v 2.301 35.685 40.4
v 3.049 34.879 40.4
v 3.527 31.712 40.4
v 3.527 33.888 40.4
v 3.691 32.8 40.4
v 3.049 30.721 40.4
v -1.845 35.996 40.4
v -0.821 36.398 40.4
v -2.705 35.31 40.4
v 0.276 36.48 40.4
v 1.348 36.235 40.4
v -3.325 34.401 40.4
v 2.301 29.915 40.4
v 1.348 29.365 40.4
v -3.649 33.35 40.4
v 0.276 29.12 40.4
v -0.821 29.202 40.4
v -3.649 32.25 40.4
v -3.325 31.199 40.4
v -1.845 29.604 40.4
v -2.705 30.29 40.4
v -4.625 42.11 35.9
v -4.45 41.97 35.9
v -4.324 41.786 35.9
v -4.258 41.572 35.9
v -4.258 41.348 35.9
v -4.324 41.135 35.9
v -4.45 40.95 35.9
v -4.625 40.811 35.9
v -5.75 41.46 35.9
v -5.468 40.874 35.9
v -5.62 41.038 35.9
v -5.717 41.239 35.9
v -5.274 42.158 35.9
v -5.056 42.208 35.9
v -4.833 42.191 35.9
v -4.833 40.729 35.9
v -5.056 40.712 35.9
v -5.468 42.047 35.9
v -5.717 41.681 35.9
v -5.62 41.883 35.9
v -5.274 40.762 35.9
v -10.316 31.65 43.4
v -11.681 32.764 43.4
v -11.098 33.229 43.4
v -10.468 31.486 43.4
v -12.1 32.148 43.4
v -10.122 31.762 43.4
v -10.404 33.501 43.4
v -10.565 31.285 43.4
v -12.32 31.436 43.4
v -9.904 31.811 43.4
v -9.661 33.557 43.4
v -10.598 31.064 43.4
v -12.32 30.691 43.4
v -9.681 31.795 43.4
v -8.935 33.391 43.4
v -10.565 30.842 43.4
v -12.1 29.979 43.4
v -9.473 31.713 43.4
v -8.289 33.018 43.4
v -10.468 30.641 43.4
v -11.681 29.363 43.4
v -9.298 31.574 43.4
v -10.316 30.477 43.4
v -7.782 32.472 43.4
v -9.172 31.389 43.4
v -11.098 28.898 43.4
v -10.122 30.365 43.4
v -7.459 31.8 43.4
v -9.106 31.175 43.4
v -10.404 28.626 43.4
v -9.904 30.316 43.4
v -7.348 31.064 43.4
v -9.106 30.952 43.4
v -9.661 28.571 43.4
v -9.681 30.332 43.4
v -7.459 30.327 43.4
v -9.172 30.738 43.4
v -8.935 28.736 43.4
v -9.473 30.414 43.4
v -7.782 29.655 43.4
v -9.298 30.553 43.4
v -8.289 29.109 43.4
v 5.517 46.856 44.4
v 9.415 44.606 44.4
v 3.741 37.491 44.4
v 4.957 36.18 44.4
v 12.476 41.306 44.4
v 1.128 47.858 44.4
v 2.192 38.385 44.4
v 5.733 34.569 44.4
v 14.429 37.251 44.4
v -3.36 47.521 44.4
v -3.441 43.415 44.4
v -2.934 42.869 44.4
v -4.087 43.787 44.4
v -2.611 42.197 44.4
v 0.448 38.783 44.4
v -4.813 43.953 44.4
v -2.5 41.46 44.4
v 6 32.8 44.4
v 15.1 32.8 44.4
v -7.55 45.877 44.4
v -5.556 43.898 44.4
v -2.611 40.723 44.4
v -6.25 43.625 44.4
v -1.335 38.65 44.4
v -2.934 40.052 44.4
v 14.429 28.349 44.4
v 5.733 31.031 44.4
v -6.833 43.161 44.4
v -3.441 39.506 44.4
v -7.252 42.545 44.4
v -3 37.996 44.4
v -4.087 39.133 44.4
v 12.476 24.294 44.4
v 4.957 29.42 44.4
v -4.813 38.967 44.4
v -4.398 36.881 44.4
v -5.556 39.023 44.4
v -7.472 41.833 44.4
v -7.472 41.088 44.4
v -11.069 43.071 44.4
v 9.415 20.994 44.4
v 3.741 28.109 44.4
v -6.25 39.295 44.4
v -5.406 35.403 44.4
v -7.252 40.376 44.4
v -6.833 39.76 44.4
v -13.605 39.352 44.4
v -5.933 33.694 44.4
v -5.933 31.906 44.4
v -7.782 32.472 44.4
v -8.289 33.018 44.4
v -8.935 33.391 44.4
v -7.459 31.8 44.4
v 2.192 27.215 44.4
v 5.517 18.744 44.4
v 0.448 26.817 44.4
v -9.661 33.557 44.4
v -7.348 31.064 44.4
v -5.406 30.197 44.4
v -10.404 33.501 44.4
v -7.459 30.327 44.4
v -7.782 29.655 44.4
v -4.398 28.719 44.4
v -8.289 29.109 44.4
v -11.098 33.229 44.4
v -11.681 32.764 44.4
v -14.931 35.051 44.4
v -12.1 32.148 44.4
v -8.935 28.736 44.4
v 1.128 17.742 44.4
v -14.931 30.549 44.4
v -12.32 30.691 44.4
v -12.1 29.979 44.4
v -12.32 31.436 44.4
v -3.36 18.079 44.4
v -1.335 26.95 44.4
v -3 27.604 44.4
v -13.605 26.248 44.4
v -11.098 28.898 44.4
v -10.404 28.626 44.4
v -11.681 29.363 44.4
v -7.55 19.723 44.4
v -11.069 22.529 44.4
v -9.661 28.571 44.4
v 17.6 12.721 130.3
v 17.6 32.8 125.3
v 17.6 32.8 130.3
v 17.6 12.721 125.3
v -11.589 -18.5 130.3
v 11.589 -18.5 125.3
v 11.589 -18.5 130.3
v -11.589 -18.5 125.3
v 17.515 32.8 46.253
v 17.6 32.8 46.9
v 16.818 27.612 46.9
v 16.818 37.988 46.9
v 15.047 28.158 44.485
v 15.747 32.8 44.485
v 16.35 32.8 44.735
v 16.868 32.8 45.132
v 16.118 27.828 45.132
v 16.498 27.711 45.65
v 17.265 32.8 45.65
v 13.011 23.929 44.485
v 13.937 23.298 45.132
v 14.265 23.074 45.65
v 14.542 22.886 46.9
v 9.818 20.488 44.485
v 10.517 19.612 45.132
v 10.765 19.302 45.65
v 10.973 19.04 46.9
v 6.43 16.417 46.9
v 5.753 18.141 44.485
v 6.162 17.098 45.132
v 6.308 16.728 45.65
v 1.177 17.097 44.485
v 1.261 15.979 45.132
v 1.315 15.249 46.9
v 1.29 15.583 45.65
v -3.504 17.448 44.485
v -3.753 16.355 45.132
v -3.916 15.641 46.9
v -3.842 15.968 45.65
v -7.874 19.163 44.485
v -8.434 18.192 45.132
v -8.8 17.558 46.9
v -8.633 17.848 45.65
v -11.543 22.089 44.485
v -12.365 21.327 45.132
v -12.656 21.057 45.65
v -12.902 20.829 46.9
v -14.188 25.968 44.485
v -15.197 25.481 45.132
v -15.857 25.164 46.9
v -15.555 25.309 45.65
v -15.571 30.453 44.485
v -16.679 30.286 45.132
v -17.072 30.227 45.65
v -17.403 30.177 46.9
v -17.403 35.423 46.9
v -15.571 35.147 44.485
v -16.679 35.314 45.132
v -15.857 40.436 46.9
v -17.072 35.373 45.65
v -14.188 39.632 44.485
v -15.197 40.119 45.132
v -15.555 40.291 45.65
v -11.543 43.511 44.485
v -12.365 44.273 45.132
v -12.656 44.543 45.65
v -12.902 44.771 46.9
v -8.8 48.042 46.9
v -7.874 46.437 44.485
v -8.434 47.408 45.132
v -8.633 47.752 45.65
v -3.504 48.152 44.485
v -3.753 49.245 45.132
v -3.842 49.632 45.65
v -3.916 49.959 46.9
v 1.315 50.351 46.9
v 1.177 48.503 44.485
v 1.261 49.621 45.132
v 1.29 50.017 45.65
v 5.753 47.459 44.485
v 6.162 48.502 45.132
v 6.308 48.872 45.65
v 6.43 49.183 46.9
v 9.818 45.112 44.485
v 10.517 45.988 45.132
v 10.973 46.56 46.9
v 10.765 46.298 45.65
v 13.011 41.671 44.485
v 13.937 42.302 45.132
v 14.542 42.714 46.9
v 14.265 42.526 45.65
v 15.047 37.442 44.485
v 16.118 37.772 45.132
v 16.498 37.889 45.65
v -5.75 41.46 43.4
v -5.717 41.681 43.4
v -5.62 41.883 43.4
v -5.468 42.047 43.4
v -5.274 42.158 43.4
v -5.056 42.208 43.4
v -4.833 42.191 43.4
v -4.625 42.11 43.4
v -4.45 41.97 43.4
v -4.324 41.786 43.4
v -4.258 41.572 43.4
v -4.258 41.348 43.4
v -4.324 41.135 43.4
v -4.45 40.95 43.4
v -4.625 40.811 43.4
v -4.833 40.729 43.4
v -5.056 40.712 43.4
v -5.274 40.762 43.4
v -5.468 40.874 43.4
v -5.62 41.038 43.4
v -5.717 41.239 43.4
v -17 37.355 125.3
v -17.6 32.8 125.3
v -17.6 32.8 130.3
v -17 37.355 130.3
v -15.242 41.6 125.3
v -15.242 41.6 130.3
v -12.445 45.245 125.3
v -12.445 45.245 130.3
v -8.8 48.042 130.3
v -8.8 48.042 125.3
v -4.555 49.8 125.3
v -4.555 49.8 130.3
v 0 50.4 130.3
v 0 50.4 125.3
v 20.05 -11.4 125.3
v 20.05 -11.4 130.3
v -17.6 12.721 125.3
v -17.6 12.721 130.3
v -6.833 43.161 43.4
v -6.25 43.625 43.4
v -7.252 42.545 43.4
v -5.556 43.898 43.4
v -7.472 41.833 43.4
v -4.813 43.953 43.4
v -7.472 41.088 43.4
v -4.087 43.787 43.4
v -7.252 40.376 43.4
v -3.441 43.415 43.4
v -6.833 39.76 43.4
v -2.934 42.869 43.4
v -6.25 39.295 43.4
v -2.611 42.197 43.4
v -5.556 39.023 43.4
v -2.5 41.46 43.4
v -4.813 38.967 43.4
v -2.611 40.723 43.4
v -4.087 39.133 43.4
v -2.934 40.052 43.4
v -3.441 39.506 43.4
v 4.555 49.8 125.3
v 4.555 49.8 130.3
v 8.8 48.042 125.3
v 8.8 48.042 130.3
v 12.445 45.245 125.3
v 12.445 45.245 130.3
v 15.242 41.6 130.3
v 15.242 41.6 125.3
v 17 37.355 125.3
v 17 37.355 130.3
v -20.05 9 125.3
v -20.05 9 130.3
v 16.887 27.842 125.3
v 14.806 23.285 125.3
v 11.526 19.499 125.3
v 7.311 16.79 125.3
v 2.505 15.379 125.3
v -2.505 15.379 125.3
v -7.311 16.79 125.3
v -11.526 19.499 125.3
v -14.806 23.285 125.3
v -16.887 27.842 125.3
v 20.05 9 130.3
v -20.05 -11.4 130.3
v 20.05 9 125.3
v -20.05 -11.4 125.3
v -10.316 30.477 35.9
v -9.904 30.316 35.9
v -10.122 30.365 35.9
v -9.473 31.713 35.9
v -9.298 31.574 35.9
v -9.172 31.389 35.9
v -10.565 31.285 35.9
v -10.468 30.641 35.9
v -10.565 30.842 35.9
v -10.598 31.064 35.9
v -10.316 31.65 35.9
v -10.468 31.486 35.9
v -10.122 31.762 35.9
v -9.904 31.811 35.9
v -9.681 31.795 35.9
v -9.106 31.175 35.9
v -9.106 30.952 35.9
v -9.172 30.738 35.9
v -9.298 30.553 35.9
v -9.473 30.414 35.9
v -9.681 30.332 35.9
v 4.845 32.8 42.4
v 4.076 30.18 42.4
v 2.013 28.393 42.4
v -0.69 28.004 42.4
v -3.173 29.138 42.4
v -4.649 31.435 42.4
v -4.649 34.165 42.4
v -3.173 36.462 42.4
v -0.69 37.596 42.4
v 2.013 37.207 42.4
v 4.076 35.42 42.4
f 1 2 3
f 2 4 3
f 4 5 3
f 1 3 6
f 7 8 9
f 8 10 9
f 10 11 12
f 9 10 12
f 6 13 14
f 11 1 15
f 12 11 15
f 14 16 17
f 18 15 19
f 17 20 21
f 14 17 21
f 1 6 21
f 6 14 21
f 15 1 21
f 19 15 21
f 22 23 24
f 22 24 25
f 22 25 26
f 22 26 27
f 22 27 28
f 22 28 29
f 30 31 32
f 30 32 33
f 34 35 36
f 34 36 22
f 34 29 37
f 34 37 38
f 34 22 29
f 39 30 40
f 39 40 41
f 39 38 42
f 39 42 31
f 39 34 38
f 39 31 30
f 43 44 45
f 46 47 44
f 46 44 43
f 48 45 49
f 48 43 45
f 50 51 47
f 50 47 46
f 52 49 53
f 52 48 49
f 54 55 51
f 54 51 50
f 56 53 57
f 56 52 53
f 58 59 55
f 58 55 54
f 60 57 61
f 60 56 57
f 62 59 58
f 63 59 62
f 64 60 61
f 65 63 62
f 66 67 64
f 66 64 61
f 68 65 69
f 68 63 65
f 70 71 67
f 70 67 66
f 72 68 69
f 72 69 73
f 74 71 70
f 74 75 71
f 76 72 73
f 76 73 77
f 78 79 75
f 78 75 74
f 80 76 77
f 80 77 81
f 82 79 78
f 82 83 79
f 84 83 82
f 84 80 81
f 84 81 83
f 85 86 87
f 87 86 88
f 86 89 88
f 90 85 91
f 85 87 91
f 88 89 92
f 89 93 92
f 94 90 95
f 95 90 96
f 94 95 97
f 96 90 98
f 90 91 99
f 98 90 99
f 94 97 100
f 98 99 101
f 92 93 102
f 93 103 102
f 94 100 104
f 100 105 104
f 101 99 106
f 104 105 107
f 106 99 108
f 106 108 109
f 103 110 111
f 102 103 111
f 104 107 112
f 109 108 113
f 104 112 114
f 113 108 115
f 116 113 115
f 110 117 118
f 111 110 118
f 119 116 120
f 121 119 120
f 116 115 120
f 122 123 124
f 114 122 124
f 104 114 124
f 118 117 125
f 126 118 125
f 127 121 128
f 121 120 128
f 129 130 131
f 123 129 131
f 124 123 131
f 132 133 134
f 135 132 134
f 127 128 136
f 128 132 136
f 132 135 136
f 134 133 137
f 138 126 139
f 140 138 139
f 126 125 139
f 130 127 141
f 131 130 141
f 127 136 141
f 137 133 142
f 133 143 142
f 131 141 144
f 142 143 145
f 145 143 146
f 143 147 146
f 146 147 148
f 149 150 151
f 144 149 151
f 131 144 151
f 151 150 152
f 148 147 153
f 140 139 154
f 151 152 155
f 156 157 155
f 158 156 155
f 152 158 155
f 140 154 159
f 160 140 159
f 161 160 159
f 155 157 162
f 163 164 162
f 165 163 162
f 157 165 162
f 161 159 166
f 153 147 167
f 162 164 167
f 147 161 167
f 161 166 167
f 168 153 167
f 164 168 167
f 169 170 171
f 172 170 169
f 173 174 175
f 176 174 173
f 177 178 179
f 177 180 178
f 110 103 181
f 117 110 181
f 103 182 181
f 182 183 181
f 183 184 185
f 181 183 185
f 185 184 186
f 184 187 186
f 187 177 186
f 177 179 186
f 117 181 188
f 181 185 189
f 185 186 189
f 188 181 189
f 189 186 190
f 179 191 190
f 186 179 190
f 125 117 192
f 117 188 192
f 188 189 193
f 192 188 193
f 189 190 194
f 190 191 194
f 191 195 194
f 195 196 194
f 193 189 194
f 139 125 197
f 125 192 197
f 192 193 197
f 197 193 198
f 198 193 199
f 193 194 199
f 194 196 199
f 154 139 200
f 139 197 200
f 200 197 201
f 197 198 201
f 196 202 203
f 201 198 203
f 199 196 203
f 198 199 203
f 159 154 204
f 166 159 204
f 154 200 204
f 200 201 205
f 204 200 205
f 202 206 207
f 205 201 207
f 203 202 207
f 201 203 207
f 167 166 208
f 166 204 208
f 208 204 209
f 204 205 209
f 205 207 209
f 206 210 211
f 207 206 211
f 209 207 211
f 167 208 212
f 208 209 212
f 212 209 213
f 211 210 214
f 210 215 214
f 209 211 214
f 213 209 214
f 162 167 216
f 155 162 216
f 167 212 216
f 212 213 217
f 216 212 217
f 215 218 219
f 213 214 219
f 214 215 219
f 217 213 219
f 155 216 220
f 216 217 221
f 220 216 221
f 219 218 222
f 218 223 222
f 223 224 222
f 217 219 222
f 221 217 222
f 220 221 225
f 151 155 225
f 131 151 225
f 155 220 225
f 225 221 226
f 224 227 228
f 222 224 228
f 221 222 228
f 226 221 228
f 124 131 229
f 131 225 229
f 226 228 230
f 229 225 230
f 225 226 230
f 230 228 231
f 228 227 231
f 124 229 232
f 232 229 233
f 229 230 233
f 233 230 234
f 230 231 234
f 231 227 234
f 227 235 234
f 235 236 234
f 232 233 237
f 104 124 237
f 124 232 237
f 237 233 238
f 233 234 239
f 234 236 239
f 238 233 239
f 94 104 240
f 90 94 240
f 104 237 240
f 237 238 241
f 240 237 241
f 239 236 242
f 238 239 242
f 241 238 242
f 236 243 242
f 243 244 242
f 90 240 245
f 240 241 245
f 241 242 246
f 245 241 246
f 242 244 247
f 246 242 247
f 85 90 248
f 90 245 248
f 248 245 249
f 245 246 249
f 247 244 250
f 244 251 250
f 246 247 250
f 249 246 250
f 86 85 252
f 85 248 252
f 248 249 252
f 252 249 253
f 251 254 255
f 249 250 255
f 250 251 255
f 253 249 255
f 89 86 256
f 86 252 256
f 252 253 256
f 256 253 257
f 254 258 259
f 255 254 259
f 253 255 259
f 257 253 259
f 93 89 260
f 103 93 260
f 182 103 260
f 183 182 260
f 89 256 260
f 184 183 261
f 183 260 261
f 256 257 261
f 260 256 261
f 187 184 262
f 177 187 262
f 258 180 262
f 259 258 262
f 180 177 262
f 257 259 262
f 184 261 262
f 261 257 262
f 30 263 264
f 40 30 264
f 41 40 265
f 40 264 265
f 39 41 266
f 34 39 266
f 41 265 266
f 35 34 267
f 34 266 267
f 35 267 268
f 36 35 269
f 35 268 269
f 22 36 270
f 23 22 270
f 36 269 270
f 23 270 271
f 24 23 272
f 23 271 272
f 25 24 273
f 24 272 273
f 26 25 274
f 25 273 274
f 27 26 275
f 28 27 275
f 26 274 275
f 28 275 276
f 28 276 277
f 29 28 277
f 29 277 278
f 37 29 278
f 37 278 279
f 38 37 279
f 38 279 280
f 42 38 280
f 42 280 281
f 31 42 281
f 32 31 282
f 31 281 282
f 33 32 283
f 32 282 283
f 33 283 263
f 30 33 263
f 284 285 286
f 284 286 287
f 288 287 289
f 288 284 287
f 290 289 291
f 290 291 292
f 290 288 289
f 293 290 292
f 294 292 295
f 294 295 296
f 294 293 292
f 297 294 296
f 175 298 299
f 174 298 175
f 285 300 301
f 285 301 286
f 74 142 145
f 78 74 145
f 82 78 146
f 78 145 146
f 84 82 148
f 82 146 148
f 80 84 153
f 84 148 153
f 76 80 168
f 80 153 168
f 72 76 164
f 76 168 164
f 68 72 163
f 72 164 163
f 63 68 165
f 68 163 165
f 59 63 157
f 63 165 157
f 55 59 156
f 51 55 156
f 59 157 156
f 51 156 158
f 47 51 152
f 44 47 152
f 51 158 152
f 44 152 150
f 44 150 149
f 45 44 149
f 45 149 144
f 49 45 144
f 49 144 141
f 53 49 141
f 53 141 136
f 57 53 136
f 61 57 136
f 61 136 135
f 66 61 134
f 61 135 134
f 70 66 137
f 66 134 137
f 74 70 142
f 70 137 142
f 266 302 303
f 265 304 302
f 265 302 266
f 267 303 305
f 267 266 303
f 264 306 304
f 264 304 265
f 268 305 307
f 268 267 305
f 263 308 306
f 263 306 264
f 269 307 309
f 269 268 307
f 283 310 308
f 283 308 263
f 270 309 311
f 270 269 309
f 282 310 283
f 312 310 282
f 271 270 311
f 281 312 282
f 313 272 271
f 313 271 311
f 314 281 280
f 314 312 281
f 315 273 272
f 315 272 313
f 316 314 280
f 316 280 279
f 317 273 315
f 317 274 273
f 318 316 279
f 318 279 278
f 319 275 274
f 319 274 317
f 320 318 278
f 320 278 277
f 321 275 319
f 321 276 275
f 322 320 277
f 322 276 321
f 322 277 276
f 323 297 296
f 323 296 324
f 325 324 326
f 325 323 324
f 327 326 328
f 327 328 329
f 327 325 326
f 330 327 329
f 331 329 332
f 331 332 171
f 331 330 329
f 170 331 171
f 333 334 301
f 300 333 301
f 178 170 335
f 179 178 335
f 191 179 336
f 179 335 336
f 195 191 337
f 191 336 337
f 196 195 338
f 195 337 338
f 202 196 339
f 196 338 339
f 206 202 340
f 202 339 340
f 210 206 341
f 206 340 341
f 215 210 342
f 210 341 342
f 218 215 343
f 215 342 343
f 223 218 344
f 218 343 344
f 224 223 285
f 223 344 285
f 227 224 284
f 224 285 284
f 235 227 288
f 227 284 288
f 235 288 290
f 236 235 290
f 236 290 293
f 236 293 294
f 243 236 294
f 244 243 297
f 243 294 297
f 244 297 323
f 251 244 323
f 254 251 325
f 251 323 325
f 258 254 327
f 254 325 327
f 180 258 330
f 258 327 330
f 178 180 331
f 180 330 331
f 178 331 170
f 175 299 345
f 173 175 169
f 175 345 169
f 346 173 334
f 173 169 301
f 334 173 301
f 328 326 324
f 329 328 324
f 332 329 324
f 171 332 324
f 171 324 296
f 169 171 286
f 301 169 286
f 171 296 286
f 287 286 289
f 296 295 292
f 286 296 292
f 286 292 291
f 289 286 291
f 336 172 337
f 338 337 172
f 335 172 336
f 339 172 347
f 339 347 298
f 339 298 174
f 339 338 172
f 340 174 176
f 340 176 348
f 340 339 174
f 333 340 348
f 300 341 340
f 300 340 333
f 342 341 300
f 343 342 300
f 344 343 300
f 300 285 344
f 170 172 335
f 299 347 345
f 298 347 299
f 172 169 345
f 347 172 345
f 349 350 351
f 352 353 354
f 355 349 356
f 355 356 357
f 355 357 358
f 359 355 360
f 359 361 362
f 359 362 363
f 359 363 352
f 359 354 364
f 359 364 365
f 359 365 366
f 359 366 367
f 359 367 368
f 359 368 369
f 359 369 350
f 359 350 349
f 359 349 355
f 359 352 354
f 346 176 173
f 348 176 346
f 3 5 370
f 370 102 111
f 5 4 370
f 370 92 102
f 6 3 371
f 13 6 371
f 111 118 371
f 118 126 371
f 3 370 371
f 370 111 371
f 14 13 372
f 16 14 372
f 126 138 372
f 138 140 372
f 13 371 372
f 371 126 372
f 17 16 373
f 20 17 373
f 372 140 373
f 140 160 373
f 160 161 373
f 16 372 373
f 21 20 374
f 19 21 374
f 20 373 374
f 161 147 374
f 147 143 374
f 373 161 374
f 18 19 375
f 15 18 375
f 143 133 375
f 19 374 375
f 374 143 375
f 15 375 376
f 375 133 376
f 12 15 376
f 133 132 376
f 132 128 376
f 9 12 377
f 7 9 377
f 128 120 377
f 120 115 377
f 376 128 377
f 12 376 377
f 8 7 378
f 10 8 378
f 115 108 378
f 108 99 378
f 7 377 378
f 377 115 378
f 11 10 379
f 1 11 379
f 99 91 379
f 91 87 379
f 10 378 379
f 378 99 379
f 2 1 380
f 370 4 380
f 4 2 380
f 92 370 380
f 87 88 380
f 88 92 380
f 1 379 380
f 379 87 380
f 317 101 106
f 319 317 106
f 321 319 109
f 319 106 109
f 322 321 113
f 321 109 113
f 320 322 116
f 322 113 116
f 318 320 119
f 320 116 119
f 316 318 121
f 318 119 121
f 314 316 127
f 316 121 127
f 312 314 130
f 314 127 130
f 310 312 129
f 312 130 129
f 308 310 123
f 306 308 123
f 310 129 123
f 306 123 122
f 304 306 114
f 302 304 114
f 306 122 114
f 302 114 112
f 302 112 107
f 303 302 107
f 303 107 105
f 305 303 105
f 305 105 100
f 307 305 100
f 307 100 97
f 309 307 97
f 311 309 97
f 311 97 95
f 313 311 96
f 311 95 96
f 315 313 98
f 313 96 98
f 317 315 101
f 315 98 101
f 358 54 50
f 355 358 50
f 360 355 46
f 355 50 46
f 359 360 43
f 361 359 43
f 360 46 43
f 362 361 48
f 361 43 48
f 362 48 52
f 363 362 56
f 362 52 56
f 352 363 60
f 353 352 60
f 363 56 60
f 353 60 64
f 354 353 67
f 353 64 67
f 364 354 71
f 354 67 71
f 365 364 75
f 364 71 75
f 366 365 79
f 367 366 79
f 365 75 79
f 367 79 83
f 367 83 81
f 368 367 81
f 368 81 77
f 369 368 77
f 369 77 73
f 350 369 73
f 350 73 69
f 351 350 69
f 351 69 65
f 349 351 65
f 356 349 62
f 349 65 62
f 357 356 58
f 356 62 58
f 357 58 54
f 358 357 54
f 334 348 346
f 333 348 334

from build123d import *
from build123d.topology import SkipClean

# Parameters (mm, degrees)
BODY_DEPTH         = 5
SKETCH4_R          = 2.5
TOP_ELECTRIC_DEPTH = 1
SKETCH6_R          = 0.75
CABLE_DEPTH        = 7.5


with BuildPart() as part:
    # Sketch1 → Body (new body)
    with BuildSketch(Plane.XY.offset(125.3)):
        with BuildLine():
            Line((-20.05, 9), (-17.6, 12.720551034))
            Line((-17.6, 12.720551034), (-17.6, 32.8))
            ThreePointArc((-17.6, 32.8), (-12.445079349, 45.245079349), (0, 50.4))
            ThreePointArc((0, 50.4), (12.445079349, 45.245079349), (17.6, 32.8))
            Line((17.6, 32.8), (17.6, 12.720551034))
            Line((17.6, 12.720551034), (20.05, 9))
            Line((20.05, 9), (20.05, 0))
            Line((20.05, 0), (20.05, -11.4))
            Line((20.05, -11.4), (11.588549493, -18.5))
            Line((11.588549493, -18.5), (7.016550666, -18.5))
            Line((7.016550666, -18.5), (-7.016550666, -18.5))
            Line((-7.016550666, -18.5), (-11.588549493, -18.5))
            Line((-11.588549493, -18.5), (-20.05, -11.4))
            Line((-20.05, -11.4), (-20.05, 0))
            Line((-20.05, 0), (-20.05, 9))
        make_face()
    extrude(amount=BODY_DEPTH)

    # Sketch3 → Motor-Body (revolve)
    with SkipClean():  # keep this step's faces unmerged: merging them makes the solid invalid here
        with BuildSketch(Plane(origin=(0, 0, 0), x_dir=(0, 0, -1), z_dir=(1, 0, 0)), mode=Mode.PRIVATE) as motor_body_sk:
            with BuildLine():
                Line((-125.3, 32.8), (-40.4, 32.8))
                Line((-40.4, 32.8), (-40.4, 36.490598923))
                Line((-40.4, 36.490598923), (-44.4, 38.8))
                Line((-44.4, 38.8), (-44.4, 47.9))
                ThreePointArc((-44.4, 47.9), (-45.132233047, 49.667766953), (-46.9, 50.4))
                Line((-46.9, 50.4), (-125.3, 50.4))
                Line((-125.3, 50.4), (-125.3, 32.8))
            make_face()
        revolve(motor_body_sk.sketch.rotate(Axis((0, 32.8, 140.3), (0, 0, -1)), 90), axis=Axis((0, 32.8, 140.3), (0, 0, -1)))  # turned: the seam where the file's is

    # Sketch4 → Top-Electric (add)
    with SkipClean():  # keep this step's faces unmerged: merging them makes the solid invalid here
        with BuildSketch(Plane(origin=(0, 0, 44.4), x_dir=(-1, 0, 0), z_dir=(0, 0, -1))):
            with Locations(Location((9.84807753, 31.063518223, 0), (0, 0, 180))):  # turned: the seam where the file's is
                Circle(SKETCH4_R)
            with Locations(Location((5, 41.460254038, 0), (0, 0, 180))):  # turned: the seam where the file's is
                Circle(SKETCH4_R)
        extrude(amount=TOP_ELECTRIC_DEPTH)

    # Sketch6 → Cable (add)
    with SkipClean():  # keep this step's faces unmerged: merging them makes the solid invalid here
        with BuildSketch(Plane(origin=(0, 0, 43.4), x_dir=(-1, 0, 0), z_dir=(0, 0, -1))):
            with Locations((5, 41.460254038)):
                Circle(SKETCH6_R)
            with Locations((9.84807753, 31.063518223)):
                Circle(SKETCH6_R)
        extrude(amount=CABLE_DEPTH)


solid = part.part
